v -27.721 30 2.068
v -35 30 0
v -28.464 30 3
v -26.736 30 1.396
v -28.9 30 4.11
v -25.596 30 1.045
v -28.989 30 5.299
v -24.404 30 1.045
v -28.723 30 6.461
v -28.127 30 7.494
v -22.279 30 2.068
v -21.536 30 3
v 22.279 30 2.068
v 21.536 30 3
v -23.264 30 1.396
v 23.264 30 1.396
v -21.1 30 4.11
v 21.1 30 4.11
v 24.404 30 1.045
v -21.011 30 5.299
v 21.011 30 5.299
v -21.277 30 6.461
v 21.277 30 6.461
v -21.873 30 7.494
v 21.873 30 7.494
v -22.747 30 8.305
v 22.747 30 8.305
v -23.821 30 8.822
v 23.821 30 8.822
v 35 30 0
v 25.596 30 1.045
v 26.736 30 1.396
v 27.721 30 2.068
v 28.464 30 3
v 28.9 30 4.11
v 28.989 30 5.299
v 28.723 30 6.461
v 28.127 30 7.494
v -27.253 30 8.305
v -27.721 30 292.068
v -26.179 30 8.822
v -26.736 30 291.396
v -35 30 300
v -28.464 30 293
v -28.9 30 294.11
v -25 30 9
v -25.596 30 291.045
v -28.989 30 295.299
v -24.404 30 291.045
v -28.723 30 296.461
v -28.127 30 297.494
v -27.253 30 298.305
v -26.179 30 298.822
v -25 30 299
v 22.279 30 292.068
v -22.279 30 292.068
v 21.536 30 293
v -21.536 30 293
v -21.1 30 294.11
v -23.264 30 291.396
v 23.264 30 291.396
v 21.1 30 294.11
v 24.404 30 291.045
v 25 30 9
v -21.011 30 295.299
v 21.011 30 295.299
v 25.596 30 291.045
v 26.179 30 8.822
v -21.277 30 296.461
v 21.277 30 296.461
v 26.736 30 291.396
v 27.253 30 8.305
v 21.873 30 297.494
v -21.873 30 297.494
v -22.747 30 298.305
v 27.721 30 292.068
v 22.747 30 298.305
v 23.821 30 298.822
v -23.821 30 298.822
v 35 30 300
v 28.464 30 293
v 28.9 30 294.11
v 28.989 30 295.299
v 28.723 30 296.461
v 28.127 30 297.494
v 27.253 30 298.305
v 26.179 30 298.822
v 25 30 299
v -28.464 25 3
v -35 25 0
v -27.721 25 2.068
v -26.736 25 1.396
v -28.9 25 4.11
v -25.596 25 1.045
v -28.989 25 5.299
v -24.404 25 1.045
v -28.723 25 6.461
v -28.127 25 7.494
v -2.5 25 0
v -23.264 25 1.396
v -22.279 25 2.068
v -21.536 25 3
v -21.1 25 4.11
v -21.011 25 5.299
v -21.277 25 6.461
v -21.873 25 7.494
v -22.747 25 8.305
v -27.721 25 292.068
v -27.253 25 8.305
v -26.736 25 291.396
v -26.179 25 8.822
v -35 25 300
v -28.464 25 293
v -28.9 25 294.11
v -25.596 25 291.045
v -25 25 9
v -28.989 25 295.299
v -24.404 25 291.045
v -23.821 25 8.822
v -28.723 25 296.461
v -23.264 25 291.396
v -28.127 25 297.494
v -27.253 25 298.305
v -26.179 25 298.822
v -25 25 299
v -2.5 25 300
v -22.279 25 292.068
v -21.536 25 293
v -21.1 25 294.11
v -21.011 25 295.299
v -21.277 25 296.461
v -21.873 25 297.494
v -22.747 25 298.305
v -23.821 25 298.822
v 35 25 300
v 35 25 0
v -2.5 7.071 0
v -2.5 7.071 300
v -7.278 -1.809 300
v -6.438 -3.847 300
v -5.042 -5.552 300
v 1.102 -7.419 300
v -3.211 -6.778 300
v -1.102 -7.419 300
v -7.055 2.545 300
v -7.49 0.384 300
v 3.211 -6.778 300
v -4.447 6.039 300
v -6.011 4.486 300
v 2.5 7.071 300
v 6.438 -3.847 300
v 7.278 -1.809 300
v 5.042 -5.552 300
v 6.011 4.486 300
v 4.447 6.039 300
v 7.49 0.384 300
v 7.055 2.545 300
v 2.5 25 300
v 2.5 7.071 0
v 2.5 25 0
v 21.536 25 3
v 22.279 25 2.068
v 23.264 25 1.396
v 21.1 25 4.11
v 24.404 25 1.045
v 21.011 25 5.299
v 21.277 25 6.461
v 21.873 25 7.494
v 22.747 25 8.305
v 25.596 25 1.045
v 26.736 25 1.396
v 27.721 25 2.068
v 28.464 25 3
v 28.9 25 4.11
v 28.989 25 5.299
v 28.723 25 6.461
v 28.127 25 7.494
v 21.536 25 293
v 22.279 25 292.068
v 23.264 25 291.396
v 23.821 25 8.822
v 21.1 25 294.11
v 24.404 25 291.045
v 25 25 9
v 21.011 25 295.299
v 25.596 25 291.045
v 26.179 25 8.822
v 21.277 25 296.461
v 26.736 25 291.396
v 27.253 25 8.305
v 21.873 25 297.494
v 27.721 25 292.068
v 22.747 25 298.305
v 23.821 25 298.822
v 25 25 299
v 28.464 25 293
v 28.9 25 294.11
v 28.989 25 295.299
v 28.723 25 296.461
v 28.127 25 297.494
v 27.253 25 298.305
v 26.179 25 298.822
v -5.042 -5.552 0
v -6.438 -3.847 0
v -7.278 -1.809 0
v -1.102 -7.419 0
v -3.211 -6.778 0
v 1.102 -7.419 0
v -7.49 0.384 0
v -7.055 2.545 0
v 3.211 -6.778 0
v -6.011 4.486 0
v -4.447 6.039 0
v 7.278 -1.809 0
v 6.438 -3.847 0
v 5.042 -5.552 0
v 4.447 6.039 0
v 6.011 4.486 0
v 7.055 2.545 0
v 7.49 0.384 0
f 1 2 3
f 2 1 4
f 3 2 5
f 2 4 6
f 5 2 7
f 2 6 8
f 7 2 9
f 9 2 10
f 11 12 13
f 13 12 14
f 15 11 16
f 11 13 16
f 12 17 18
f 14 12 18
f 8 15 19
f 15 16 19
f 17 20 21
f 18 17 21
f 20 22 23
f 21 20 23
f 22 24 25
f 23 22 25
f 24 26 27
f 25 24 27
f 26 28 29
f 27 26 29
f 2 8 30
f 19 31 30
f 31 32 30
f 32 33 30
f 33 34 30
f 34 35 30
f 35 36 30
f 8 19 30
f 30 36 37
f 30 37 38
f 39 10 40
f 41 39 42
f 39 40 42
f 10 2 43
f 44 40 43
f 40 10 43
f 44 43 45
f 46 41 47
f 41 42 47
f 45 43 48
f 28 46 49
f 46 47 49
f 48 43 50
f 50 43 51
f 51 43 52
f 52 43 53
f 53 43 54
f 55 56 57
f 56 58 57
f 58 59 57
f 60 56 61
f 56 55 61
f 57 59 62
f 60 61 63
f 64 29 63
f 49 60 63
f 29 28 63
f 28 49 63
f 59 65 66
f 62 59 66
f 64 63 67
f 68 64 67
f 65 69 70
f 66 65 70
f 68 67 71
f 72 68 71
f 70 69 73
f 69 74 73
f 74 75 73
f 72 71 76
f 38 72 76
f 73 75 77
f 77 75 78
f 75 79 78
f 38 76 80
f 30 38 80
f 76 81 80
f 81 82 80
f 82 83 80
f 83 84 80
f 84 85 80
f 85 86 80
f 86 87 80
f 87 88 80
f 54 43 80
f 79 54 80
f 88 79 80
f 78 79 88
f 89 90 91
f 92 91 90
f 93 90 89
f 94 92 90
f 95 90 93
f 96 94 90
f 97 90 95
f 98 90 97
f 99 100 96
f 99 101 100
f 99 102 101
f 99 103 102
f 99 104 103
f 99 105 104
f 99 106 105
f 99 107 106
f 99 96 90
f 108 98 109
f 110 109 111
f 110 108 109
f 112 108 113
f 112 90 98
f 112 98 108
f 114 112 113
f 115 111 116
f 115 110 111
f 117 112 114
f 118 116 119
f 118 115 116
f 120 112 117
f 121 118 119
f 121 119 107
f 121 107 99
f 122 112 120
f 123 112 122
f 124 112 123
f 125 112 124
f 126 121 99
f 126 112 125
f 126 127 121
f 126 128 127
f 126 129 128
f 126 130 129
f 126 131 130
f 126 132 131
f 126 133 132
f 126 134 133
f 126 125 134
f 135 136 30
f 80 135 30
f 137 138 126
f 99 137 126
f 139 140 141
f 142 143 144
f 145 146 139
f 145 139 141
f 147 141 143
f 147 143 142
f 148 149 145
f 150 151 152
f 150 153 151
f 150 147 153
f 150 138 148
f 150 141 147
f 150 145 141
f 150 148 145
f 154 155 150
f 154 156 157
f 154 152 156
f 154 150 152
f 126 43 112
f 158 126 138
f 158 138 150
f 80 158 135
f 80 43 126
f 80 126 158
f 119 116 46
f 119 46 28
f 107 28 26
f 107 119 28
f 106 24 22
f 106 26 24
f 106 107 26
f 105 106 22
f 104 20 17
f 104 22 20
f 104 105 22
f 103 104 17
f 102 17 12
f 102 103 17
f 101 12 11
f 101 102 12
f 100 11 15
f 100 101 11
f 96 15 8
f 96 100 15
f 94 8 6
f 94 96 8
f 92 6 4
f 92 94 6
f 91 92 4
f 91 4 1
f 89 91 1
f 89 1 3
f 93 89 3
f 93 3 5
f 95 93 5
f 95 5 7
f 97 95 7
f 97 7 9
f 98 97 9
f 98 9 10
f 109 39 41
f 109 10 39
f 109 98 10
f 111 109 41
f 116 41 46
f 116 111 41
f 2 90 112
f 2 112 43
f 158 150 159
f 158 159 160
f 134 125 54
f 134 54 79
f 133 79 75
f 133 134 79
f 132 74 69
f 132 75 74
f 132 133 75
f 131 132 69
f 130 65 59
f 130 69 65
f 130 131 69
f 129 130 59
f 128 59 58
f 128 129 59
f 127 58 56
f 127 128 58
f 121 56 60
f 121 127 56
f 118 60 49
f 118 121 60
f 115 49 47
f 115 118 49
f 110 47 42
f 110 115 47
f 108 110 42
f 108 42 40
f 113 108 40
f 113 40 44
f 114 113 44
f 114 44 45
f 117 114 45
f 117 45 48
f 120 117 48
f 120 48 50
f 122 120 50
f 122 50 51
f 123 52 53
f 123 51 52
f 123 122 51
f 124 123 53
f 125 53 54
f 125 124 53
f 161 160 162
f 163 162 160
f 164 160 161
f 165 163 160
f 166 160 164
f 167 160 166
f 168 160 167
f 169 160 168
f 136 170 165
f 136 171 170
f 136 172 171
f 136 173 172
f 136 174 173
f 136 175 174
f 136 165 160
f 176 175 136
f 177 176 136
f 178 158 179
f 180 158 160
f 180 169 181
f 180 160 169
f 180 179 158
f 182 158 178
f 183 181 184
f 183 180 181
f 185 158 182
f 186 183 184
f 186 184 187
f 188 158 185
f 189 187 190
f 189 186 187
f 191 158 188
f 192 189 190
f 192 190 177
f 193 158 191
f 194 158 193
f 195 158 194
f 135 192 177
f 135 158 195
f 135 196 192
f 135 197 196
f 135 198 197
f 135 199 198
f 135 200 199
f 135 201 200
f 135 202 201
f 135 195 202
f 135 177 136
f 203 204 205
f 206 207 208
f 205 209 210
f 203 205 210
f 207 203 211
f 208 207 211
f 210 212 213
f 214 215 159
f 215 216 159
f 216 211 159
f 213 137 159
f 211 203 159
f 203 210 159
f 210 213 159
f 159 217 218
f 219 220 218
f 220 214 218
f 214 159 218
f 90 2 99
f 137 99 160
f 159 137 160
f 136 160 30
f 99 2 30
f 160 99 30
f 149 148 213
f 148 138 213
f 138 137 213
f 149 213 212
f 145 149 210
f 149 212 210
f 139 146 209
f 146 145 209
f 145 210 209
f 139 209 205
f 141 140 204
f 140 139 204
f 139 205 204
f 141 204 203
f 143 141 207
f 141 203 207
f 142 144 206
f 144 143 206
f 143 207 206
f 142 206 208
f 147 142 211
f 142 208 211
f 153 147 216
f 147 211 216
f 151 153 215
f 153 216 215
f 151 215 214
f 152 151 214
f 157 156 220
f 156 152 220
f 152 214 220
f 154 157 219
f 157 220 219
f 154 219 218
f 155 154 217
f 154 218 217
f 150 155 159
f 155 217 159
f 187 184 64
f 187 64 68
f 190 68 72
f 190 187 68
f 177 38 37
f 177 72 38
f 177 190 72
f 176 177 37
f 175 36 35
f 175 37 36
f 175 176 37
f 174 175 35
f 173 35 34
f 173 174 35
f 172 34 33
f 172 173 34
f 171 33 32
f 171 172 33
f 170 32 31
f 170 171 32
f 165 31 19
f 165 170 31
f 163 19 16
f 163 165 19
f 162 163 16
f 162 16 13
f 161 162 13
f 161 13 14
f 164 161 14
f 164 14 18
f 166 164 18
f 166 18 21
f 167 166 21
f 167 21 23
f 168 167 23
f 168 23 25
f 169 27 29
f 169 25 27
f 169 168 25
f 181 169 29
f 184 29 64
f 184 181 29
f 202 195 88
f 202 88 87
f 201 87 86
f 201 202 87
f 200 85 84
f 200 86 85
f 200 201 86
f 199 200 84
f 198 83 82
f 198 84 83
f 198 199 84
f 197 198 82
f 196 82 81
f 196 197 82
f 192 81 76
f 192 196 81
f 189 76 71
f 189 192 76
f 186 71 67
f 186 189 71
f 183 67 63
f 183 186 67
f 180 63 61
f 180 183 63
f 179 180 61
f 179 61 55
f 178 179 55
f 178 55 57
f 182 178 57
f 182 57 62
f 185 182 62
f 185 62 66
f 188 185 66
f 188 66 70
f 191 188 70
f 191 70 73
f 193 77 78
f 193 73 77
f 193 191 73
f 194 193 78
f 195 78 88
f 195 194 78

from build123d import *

# Parameters (mm, degrees)
SKETCH1_R               = 7.5
BOSS_EXTRUDE1_DEPTH     = 300
SKETCH3_W               = 5
SKETCH3_H               = 30
BOSS_EXTRUDE2_DEPTH     = 300
SKETCH4_W               = 70
SKETCH4_H               = 5
BOSS_EXTRUDE3_DEPTH     = 300
CUT_EXTRUDE1_DEPTH      = 305.353823699
CUT_EXTRUDE1_DEPTH_BACK = 305.353823699
SKETCH6_R               = 4


with BuildPart() as part:
    # Sketch1 → Boss-Extrude1 (new body)
    with BuildSketch(Plane.XY):
        Circle(SKETCH1_R)
    extrude(amount=BOSS_EXTRUDE1_DEPTH)

    # Sketch3 → Boss-Extrude2 (add)
    with BuildSketch(Plane.XY.offset(300)):
        with Locations((0, 15)):
            Rectangle(SKETCH3_W, SKETCH3_H)
    extrude(amount=-BOSS_EXTRUDE2_DEPTH)

    # Sketch4 → Boss-Extrude3 (add)
    with BuildSketch(Plane.XY.offset(300)):
        with Locations((0, 27.5)):
            Rectangle(SKETCH4_W, SKETCH4_H)
    extrude(amount=-BOSS_EXTRUDE3_DEPTH)

    # Sketch6 → Cut-Extrude1 (cut, two sides: drawn at the far end of the back side and taken through both)
    with BuildSketch(Plane(origin=(0, 30, 0), x_dir=(1, 0, 0), z_dir=(0, 1, 0)).offset(-CUT_EXTRUDE1_DEPTH_BACK)):
        with Locations(Location((-25, -5, 0), (0, 0, 270))):
            Circle(SKETCH6_R)
        with Locations(Location((25, -5, 0), (0, 0, 270))):
            Circle(SKETCH6_R)
        with Locations(Location((25, -295, 0), (0, 0, 270))):
            Circle(SKETCH6_R)
        with Locations(Location((-25, -295, 0), (0, 0, 270))):
            Circle(SKETCH6_R)
    extrude(amount=CUT_EXTRUDE1_DEPTH + CUT_EXTRUDE1_DEPTH_BACK, mode=Mode.SUBTRACT)


solid = part.part
